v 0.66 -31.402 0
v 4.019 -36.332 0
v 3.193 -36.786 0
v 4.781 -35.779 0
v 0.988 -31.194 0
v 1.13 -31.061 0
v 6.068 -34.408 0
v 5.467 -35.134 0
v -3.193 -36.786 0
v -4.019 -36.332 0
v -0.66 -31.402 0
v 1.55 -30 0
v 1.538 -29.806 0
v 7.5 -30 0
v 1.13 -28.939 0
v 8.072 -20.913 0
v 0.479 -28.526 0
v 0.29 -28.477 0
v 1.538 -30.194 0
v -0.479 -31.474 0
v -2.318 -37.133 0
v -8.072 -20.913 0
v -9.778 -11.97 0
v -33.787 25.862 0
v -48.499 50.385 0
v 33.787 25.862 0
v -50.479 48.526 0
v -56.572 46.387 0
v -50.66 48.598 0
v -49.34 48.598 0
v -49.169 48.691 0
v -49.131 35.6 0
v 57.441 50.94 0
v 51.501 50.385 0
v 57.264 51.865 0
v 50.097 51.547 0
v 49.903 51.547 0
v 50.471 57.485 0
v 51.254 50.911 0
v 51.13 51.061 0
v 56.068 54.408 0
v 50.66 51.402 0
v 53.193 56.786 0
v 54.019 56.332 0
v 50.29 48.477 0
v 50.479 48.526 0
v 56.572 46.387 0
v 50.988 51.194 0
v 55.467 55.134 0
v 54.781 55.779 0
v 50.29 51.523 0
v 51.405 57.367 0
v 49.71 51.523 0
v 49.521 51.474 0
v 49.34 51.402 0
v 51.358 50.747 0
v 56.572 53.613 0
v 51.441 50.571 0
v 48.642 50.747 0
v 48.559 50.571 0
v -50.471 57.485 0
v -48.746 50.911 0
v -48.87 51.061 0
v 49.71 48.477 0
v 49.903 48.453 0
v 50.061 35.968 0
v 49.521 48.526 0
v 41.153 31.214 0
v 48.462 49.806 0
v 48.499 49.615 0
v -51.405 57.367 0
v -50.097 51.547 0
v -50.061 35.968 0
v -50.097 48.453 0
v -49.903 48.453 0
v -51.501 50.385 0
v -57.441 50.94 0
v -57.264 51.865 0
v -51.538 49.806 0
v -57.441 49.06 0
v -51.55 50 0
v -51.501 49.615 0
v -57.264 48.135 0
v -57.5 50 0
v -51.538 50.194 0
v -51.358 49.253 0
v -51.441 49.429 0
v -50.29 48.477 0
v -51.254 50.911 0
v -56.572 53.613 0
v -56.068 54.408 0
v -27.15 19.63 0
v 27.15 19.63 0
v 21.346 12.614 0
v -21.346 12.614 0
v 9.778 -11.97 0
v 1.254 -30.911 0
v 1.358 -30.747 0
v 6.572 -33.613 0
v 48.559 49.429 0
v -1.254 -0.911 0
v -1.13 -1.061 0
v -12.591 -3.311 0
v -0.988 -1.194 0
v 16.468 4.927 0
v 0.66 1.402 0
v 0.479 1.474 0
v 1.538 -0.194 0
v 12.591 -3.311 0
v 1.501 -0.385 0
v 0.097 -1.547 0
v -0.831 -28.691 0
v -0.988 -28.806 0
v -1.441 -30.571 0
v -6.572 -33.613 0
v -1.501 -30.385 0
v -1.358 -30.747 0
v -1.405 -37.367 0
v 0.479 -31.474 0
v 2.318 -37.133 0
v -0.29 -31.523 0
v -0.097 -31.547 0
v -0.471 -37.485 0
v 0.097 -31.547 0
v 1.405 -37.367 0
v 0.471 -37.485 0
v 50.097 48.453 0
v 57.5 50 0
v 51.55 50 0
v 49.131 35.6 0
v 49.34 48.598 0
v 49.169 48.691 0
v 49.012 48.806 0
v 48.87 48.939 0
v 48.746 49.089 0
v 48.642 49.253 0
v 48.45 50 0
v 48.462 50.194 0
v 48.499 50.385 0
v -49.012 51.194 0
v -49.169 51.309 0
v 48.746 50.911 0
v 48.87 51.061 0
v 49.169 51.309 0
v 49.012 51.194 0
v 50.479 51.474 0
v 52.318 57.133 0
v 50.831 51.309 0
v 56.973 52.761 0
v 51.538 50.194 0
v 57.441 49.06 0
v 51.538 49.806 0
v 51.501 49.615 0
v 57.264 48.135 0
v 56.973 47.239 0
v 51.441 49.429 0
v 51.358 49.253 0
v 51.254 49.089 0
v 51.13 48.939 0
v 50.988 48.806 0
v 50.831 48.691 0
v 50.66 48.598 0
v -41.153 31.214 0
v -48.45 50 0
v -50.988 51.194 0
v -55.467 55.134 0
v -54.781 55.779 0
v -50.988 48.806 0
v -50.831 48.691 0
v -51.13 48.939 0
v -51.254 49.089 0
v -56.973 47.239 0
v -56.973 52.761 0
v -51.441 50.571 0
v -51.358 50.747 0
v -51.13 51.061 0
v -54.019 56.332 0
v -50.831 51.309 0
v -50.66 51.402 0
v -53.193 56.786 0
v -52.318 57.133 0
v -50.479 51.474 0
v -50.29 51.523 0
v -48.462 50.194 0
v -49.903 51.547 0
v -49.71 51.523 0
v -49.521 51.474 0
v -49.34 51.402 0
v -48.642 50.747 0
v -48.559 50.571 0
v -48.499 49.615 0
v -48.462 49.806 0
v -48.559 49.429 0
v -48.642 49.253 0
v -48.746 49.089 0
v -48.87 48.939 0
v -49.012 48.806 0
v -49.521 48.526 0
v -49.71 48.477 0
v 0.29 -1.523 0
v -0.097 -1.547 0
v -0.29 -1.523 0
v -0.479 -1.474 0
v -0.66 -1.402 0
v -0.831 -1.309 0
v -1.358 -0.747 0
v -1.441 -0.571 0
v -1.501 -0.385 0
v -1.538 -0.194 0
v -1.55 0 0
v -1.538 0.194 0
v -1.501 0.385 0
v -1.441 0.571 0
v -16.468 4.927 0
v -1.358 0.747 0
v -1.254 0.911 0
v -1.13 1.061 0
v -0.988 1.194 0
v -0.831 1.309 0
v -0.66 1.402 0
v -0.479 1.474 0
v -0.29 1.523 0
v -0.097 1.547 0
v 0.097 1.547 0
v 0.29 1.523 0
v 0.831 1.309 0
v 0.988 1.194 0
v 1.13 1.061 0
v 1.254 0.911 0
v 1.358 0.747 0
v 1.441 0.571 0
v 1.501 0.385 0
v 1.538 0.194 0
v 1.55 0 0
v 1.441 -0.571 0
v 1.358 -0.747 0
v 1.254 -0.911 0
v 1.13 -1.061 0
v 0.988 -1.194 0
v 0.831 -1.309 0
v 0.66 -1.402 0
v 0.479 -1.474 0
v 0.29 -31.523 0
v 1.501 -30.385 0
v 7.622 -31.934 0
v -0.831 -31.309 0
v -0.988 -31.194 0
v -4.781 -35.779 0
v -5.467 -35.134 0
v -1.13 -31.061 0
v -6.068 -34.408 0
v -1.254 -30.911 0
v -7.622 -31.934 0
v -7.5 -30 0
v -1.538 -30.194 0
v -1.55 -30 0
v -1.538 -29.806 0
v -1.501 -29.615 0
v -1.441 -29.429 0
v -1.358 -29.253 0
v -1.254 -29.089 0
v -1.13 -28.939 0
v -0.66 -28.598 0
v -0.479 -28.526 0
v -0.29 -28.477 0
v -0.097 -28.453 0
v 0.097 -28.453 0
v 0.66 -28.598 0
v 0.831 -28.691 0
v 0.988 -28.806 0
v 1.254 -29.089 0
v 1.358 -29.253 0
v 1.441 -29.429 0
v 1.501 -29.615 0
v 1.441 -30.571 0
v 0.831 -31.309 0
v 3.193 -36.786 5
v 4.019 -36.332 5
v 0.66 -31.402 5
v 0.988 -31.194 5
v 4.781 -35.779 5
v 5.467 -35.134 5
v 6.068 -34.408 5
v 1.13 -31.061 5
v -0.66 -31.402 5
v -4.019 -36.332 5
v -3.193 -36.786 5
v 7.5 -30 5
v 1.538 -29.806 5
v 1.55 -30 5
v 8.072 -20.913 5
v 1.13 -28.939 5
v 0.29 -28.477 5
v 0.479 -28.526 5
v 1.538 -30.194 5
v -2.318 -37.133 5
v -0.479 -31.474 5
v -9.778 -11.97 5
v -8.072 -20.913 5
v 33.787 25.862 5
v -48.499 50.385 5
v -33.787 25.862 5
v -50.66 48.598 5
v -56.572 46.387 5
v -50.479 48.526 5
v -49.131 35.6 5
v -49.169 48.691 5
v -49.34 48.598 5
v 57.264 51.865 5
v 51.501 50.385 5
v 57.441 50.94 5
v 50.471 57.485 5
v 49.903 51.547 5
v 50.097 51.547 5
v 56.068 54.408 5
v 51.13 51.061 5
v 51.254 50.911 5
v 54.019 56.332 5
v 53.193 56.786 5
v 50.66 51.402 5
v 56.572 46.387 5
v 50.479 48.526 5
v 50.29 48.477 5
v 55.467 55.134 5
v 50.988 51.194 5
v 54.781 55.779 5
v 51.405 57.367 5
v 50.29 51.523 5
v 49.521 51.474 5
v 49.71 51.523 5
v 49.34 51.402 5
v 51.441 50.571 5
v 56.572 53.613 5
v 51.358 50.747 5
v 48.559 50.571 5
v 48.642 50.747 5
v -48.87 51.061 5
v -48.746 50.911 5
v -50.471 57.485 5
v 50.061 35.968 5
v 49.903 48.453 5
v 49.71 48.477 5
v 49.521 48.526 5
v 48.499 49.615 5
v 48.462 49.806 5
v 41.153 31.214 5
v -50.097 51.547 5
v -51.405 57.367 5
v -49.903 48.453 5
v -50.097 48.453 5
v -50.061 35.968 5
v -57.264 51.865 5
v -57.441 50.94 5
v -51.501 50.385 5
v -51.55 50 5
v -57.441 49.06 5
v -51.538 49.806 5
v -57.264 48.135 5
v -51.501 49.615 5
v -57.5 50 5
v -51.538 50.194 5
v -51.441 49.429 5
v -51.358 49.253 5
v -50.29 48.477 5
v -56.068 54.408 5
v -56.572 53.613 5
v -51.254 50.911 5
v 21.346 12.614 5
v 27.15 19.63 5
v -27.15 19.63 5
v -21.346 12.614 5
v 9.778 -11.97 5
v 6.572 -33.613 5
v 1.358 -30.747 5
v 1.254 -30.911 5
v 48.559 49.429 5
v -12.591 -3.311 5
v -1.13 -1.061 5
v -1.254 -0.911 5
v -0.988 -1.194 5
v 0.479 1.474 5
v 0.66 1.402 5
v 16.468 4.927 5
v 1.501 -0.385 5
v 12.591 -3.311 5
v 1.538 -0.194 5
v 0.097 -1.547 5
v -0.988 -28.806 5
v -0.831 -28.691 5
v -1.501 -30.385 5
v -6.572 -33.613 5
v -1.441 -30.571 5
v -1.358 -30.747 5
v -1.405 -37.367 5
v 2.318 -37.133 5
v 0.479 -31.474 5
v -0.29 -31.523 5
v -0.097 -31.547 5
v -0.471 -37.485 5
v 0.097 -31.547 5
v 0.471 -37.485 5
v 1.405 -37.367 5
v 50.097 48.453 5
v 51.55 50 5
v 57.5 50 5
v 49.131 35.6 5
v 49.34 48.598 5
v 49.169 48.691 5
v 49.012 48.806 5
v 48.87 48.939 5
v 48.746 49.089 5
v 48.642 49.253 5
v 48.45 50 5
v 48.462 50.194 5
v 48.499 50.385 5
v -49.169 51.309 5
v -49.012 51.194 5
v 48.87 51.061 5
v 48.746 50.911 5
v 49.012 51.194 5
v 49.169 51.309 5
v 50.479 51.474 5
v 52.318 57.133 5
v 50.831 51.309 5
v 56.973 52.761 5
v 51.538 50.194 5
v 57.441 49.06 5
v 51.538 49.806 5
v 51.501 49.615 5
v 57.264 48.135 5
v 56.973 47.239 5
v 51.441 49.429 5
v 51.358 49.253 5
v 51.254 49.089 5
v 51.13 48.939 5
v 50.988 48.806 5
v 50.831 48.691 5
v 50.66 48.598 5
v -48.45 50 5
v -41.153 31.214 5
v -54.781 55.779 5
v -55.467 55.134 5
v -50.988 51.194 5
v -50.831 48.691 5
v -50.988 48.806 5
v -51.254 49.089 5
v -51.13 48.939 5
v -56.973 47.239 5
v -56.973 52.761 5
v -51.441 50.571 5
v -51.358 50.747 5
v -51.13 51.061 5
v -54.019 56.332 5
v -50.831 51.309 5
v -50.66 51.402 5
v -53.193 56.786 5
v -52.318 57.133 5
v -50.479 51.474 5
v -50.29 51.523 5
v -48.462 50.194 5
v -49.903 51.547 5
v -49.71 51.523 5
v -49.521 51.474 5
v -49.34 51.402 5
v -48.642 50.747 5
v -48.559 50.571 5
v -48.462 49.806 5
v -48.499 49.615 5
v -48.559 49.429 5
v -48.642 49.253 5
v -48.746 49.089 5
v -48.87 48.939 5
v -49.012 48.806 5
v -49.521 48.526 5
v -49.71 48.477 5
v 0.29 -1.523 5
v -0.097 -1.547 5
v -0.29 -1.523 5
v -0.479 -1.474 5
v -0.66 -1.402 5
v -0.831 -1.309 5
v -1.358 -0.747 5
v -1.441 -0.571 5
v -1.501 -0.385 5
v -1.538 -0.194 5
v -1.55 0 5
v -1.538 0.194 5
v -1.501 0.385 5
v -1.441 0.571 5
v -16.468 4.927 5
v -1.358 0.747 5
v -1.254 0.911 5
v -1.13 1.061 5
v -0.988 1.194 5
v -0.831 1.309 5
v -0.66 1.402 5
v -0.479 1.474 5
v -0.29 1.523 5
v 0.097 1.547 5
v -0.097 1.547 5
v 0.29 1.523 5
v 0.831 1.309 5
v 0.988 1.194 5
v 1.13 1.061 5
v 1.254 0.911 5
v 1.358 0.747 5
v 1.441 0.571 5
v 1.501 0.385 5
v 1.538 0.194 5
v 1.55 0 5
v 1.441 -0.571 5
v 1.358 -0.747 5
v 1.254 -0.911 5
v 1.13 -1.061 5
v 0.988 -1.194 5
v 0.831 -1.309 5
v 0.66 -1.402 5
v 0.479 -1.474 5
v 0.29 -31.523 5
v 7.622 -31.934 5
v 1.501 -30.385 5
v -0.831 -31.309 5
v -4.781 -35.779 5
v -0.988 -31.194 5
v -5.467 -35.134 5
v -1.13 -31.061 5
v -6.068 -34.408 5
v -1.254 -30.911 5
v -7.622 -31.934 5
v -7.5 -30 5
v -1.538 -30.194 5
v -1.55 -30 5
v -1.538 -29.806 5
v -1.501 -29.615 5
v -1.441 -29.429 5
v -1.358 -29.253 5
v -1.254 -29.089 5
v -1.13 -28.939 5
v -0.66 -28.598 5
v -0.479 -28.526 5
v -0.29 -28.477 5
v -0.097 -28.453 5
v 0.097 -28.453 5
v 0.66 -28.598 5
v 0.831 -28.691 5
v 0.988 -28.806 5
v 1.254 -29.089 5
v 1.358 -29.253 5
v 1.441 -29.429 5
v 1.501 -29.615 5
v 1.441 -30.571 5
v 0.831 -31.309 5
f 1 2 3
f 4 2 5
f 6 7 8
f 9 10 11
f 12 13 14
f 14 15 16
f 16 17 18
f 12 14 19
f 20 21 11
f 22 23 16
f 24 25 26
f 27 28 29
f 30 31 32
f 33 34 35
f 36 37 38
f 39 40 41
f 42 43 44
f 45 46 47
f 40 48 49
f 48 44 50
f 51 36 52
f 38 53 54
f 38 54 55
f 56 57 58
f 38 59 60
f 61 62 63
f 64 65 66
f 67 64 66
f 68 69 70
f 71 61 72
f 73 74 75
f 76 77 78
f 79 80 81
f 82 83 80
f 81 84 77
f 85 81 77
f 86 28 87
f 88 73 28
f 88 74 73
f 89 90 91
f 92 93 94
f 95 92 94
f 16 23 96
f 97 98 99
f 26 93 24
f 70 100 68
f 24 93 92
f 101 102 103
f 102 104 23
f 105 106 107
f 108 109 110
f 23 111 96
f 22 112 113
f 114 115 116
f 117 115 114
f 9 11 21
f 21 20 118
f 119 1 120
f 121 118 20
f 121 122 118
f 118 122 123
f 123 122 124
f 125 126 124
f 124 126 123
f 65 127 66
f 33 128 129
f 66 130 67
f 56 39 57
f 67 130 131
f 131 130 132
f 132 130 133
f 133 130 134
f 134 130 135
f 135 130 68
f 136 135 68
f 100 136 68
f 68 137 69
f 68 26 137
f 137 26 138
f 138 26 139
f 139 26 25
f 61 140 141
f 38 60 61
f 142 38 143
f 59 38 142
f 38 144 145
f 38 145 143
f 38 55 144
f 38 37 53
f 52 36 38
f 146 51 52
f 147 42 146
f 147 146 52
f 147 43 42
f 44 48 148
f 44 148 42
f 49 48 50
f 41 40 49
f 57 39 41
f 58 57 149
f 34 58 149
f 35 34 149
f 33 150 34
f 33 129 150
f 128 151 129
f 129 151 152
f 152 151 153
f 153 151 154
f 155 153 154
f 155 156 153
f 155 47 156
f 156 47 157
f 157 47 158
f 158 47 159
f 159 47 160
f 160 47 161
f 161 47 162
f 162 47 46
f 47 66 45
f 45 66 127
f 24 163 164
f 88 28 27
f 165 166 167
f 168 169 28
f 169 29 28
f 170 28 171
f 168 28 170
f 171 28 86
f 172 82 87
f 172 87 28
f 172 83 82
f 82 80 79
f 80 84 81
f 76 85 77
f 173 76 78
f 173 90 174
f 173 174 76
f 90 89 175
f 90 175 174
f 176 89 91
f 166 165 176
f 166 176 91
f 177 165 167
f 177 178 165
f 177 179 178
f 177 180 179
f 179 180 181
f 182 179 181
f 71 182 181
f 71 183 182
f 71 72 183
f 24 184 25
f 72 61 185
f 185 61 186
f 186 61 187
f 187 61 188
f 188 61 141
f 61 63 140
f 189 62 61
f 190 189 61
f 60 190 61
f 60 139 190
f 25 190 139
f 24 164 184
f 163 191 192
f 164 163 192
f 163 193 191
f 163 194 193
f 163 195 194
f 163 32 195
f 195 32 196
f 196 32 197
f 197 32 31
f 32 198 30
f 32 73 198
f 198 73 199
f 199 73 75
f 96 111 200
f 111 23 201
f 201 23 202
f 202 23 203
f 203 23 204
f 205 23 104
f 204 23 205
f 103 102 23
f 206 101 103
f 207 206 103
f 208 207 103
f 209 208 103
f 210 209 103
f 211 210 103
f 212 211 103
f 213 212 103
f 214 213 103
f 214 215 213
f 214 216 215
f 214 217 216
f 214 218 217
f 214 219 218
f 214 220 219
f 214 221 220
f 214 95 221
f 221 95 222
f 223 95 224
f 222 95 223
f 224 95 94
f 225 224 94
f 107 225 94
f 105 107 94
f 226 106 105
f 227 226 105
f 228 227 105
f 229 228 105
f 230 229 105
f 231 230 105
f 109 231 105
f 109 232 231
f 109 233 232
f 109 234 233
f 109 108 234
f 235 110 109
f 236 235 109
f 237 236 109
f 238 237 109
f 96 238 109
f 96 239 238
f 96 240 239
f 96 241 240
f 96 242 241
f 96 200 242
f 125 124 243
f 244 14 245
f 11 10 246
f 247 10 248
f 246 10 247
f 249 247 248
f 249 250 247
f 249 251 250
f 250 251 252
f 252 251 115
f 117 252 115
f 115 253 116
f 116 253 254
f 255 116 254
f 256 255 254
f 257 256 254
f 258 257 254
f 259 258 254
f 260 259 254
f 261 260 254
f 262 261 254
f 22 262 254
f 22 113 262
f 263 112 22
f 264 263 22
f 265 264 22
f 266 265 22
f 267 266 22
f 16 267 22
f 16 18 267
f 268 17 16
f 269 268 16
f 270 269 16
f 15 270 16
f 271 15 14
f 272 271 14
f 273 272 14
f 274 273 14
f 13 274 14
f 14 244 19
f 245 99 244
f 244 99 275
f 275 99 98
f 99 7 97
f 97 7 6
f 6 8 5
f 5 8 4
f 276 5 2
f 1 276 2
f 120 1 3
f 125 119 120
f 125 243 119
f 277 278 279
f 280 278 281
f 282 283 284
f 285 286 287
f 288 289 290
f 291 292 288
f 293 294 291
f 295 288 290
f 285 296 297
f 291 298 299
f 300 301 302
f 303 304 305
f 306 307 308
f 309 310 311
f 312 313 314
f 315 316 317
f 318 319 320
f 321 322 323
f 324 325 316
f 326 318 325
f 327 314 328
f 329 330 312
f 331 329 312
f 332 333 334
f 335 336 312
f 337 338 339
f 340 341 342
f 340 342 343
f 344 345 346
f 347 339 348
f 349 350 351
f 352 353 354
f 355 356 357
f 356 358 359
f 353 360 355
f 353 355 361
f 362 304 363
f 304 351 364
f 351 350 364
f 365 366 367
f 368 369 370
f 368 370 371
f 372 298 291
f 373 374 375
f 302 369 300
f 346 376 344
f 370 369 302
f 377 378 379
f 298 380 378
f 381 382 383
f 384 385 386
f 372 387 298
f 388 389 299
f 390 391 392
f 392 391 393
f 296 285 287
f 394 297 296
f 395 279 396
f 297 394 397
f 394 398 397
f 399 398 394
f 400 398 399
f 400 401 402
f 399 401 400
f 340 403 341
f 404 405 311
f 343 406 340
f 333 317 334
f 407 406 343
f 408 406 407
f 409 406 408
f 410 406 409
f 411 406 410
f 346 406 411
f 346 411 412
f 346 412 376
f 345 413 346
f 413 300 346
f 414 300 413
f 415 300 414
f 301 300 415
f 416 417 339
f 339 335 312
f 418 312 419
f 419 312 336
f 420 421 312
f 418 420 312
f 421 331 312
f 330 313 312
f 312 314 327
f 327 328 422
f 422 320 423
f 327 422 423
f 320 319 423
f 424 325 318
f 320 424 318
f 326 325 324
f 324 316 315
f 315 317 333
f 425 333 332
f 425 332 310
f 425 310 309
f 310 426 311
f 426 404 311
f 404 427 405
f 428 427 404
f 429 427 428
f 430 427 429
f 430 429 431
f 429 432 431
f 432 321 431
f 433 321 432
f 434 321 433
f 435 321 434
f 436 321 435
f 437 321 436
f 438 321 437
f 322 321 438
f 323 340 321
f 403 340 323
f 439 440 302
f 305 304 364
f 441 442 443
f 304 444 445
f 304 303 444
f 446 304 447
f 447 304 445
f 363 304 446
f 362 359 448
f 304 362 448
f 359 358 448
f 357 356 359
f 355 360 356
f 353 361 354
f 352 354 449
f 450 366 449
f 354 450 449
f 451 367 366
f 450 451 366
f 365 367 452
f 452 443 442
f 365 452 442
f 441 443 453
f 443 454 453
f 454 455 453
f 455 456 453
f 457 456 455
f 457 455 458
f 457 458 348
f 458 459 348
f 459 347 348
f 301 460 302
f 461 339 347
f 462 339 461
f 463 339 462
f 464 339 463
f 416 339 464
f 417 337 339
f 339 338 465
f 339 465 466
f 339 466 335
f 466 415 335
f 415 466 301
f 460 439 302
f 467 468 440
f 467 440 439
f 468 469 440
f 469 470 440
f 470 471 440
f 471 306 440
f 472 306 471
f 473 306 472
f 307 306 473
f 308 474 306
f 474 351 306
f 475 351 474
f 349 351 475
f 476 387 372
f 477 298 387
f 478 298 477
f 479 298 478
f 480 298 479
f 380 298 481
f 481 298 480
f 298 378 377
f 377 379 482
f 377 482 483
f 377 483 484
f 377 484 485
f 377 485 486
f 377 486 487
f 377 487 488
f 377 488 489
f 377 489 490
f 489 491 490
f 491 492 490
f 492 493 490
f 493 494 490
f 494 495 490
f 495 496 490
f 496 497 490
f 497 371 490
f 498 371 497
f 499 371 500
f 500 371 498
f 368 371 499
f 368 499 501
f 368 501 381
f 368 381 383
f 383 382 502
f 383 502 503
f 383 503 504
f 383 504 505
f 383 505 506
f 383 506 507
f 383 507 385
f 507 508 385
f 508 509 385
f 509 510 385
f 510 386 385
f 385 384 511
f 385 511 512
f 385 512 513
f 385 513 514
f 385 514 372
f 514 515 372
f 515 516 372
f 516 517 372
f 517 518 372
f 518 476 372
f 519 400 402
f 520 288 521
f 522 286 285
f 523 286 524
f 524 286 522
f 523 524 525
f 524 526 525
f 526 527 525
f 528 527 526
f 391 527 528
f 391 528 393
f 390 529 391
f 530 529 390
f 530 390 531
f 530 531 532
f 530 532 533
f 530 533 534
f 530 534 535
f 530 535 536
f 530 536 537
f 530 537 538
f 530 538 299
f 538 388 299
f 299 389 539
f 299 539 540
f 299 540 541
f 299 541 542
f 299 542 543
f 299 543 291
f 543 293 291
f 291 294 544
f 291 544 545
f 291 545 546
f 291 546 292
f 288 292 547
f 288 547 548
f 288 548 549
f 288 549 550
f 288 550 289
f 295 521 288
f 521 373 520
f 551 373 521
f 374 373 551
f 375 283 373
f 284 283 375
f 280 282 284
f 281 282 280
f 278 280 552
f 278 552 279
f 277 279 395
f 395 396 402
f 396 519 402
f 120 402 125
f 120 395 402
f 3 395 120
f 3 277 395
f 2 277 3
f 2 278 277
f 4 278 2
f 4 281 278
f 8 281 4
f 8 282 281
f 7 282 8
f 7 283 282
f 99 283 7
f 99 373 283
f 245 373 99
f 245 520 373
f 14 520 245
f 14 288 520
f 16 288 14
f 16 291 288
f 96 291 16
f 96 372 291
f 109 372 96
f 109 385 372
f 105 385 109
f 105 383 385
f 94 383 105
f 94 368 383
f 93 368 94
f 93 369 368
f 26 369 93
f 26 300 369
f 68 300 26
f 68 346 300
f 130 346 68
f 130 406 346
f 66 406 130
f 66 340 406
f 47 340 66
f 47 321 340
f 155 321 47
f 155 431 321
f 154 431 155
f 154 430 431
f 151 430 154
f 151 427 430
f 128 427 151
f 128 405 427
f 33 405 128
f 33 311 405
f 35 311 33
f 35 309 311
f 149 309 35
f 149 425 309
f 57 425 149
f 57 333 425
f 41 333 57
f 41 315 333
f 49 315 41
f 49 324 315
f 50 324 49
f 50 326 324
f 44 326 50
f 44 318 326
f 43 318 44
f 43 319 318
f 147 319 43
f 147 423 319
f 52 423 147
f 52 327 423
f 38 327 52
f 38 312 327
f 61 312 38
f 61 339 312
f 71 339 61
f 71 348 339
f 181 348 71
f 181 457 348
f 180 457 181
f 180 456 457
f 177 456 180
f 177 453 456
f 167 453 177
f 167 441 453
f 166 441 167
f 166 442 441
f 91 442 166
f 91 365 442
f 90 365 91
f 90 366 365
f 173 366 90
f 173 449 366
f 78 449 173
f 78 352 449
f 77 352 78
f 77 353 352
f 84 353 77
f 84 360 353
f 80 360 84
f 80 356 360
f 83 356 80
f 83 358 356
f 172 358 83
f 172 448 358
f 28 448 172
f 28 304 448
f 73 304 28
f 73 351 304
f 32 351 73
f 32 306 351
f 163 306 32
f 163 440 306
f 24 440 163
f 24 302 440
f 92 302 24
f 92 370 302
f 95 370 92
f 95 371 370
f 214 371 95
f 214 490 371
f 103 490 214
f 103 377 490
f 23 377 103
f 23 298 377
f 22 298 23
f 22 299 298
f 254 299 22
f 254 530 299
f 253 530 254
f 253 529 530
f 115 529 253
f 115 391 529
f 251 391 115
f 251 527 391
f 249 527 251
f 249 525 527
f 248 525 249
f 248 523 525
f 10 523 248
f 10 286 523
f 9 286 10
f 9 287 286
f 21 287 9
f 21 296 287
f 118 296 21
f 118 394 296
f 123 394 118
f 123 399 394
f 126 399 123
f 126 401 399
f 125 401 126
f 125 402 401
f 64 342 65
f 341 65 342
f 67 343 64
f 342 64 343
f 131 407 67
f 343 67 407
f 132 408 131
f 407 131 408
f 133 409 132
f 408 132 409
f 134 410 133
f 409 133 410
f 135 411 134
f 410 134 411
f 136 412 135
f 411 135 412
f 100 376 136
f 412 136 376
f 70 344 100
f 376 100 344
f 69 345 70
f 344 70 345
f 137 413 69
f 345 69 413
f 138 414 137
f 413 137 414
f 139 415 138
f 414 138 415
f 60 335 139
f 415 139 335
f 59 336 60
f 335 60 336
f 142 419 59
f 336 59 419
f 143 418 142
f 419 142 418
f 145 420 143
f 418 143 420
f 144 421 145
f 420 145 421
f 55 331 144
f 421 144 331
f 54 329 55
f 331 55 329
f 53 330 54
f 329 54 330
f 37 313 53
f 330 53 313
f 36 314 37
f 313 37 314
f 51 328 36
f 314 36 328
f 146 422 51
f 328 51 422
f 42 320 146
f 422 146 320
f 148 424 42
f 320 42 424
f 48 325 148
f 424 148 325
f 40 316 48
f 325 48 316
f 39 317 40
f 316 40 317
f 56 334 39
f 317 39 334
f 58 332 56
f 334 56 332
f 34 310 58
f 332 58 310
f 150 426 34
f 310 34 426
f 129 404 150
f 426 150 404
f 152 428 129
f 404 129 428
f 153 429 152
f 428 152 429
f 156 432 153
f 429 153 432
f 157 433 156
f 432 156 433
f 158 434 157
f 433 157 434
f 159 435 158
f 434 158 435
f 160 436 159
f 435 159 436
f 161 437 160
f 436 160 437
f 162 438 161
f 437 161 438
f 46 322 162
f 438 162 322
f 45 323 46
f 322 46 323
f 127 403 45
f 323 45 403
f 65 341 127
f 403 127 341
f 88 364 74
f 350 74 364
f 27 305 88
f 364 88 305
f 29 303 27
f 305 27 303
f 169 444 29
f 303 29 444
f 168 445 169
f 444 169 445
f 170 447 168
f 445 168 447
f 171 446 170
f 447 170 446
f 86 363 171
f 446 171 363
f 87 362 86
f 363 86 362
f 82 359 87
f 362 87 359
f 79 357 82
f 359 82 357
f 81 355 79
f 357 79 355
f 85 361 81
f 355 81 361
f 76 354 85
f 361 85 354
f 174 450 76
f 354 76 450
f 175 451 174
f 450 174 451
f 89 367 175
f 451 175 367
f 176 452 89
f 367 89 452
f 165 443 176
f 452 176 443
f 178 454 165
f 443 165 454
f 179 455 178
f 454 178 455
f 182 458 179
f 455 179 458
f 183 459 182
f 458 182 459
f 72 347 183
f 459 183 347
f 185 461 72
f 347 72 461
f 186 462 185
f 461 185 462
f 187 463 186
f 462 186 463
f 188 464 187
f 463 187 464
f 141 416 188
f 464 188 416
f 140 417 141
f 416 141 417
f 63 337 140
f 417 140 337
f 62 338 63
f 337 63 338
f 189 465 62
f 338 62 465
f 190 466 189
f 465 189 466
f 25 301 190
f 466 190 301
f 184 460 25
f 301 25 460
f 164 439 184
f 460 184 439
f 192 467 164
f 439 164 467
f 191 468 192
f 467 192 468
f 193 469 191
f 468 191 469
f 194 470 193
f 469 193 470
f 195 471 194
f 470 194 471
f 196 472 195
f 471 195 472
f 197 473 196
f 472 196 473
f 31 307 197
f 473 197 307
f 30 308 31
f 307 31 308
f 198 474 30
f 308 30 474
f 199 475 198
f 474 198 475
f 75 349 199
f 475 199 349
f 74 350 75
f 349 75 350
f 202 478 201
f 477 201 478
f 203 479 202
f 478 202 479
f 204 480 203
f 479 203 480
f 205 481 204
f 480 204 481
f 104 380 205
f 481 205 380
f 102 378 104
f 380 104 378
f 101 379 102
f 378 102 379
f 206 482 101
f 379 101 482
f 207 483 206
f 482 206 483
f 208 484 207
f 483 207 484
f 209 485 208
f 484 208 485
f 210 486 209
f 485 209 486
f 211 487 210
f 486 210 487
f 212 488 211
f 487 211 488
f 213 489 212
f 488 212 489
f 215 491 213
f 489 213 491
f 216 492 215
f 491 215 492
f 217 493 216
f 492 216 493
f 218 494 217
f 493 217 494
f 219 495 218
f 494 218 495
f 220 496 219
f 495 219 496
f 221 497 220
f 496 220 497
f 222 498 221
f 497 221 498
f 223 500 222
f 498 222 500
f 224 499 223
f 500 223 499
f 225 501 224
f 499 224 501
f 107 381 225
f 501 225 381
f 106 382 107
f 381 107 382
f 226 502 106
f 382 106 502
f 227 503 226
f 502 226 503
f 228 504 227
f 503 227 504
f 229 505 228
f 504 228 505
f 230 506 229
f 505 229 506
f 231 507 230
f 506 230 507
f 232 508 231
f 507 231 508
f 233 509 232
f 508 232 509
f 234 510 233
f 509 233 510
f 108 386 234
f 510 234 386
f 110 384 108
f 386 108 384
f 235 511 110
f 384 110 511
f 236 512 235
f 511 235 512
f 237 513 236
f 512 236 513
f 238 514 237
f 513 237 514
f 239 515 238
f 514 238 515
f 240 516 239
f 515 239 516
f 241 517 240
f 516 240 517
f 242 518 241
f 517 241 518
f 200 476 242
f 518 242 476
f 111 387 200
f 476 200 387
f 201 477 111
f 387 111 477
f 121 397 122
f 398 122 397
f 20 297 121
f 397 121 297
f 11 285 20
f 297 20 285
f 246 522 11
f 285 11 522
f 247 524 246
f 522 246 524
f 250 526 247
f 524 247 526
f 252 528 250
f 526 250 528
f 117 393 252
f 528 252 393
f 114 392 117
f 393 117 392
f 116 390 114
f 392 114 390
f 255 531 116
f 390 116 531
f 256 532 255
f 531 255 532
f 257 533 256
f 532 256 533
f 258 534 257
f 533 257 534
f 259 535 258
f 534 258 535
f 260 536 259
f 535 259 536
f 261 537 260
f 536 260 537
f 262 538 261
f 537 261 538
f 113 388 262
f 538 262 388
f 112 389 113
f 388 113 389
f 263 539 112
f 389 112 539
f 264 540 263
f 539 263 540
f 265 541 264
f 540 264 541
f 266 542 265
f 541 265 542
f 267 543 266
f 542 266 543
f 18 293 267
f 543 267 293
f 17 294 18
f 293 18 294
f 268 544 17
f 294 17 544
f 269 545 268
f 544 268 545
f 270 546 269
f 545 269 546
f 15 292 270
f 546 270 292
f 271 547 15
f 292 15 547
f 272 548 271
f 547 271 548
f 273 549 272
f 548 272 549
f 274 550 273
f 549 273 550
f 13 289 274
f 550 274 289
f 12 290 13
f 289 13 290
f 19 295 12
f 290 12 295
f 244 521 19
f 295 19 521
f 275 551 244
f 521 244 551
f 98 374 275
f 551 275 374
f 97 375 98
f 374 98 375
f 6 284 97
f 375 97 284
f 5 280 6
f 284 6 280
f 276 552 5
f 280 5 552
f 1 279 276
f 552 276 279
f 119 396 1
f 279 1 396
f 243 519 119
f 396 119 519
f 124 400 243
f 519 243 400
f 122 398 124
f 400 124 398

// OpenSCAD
// file: globs.scad
/* Global definitions for millihertz 5 */

// Ball bearings are sold as 6mm. We have seen two
// versions, one at 6.35mm (1/4") and one at 6.15mm.

ball_bearing_diameter = 6.35;
ball_bearing_radius = ball_bearing_diameter / 2;
pipe_outer_diameter = 11;
pipe_inner_diameter = 8;

/* All dimensions are in millimetres */
memory_slope = 10; // Degrees

/** Memory cell pitch - the horizontal and vertical distances between one row and the next. Memory is arranged so one column (y) make up one word. Words are laid out vertically. */
memory_cell_pitch_x = 16;
memory_cell_pitch_y = 28 * cos(memory_slope);

// Max wire diameter is 1.59mm for 6.35mm ball bearings.
stage1_wire_diameter = 1.45; // Equivalent to AWG 15 / SWG 17.
stage2_wire_diameter = 2.337; // SWG 13

/* Number of bits used in the data. This must be 32. */
bits = 32;

/* Global pitch - the horizontal spacing between each bit */
pitch = 23;

/** Frame */

frame_internal_width = 900;
frame_internal_height = 2200;

/** Frame will probably be 50mm angle iron */
frame_width = 50;

/* Bowden cable specs based on lightweight 'snake' cable */

bowden_cable_inner_diameter = 2;
bowden_cable_outer_diameter = 3.5;

bowden_cable_travel = 10;

/* Specific names for the subtractor */
subtractor_pitch_x = pitch;
subtractor_pitch_y = 27;

memory_columns_per_cell = 8;

// Memory cell height
cell_height = 14;

// Gap between two memory cell units - allows for the last useless row
// in the cell and a gap of 20 to place a delay unit if necessary. The
// delay unit may be needed to slow the ball bearing to avoid damage to
// memory selectors.
memory_unit_gap = cell_height+20;

// centre_gap is a split in the middle of the two lanes
// to join cells together (since we will likely have two
// 16-bit memory cells, and 2 16-bit adders, there will
// be a gap needed to join them.
centre_gap = 50;

/* Colour for illustrating ball bearing paths */

bb_trace_colour = [0.5,0.0,0.0,0.5];


channel_width = 7; // Width of channels ball bearings roll in

columns_per_block = 8; // Number of columns in each injector/diverter block

enumerator_rod_travel = 7;

// Used mainly by injector
function ejector_xpos(col) = 20+col*pitch+channel_width/2;


//Operator modules to produce acrylic plates easily
module vertical_plate_x()
{
  rotate([90,0,0]) linear_extrude(height=3) children();
}

module vertical_plate_y()
{
  rotate([0,0,90]) rotate([90,0,0]) linear_extrude(height=3) children();
}

module horizontal_plate()
{
  linear_extrude(height=3) children();
}


// Distance between vertical support rails (centre to centre). This is for the internal rails. There are larger superrails which connect over longer distances.
support_rail_separation = 250;

// 250mm separation gives 235mm internal spacing between bars


// Canonical channel 0 position - the leftmost channel - should be 30mm right of the centre of the rail.

/*
     30mm
   <------>
 15mm     v
<---->    v
|    |    v
|BEAM|    v
|    |    v

*/


hex_bar_af = 4.75; // 6BA hex bar from Noggin End Metals measured as 4.75mm AF.

// Calculate the max radius of the bar
hex_bar_max_radius = (hex_bar_af / 2) / cos(30);

module hex_bar_2d() {
    r = hex_bar_max_radius;
    polygon(points = [ [ r * cos(0), r * sin(0) ],
		       [ r * cos(60), r * sin(60) ],
		       [ r * cos(120), r * sin(120) ],
		       [ r * cos(180), r * sin(180) ],
		       [ r * cos(240), r * sin(240) ],
		       [ r * cos(300), r * sin(300) ] ]);
}


// X coordinate of data channel 7 entering memory, relative to the left edge of the left openbeam
data7_x = 40.5;
data7_y = -11.5;


// Perforated angle iron layout
angle_iron_internal_spacing=265;
angle_iron_hole_offset = 19.5;

slot_spacing = 50;
slot_diameter = 6;
slot_height = 28;
// main file
include <globs.scad>;
$fn=50;

module pulley_holder_2d() {
  hole_pos = [[0,0], [0,-30], [50,50], [-50,50]];
  difference() {
    union() {

      hull() {
	for(i=hole_pos) {
	  translate(i) circle(d=15);
	}
	rotate(-45) translate([-7.5,0]) square([15,sqrt(50*50*2)]);
	rotate(45) translate([-7.5,0]) square([15,sqrt(50*50*2)]);
      }
    }
    for(i=hole_pos) {
      translate(i) circle(d=3.1);
    }
    n=80;
    translate([-n,-30]) circle(r=n-7.5);
    translate([n,-30]) circle(r=n-7.5);
  }
}

module pulley_holder() {
  linear_extrude(height=5) pulley_holder_2d();
}

module injector_clip() {
  difference() {
    cube([13,10,10]);
    translate([4,-1,3]) cube([5.2,12,12]);
  }
}


//injector_clip();

pulley_holder();
